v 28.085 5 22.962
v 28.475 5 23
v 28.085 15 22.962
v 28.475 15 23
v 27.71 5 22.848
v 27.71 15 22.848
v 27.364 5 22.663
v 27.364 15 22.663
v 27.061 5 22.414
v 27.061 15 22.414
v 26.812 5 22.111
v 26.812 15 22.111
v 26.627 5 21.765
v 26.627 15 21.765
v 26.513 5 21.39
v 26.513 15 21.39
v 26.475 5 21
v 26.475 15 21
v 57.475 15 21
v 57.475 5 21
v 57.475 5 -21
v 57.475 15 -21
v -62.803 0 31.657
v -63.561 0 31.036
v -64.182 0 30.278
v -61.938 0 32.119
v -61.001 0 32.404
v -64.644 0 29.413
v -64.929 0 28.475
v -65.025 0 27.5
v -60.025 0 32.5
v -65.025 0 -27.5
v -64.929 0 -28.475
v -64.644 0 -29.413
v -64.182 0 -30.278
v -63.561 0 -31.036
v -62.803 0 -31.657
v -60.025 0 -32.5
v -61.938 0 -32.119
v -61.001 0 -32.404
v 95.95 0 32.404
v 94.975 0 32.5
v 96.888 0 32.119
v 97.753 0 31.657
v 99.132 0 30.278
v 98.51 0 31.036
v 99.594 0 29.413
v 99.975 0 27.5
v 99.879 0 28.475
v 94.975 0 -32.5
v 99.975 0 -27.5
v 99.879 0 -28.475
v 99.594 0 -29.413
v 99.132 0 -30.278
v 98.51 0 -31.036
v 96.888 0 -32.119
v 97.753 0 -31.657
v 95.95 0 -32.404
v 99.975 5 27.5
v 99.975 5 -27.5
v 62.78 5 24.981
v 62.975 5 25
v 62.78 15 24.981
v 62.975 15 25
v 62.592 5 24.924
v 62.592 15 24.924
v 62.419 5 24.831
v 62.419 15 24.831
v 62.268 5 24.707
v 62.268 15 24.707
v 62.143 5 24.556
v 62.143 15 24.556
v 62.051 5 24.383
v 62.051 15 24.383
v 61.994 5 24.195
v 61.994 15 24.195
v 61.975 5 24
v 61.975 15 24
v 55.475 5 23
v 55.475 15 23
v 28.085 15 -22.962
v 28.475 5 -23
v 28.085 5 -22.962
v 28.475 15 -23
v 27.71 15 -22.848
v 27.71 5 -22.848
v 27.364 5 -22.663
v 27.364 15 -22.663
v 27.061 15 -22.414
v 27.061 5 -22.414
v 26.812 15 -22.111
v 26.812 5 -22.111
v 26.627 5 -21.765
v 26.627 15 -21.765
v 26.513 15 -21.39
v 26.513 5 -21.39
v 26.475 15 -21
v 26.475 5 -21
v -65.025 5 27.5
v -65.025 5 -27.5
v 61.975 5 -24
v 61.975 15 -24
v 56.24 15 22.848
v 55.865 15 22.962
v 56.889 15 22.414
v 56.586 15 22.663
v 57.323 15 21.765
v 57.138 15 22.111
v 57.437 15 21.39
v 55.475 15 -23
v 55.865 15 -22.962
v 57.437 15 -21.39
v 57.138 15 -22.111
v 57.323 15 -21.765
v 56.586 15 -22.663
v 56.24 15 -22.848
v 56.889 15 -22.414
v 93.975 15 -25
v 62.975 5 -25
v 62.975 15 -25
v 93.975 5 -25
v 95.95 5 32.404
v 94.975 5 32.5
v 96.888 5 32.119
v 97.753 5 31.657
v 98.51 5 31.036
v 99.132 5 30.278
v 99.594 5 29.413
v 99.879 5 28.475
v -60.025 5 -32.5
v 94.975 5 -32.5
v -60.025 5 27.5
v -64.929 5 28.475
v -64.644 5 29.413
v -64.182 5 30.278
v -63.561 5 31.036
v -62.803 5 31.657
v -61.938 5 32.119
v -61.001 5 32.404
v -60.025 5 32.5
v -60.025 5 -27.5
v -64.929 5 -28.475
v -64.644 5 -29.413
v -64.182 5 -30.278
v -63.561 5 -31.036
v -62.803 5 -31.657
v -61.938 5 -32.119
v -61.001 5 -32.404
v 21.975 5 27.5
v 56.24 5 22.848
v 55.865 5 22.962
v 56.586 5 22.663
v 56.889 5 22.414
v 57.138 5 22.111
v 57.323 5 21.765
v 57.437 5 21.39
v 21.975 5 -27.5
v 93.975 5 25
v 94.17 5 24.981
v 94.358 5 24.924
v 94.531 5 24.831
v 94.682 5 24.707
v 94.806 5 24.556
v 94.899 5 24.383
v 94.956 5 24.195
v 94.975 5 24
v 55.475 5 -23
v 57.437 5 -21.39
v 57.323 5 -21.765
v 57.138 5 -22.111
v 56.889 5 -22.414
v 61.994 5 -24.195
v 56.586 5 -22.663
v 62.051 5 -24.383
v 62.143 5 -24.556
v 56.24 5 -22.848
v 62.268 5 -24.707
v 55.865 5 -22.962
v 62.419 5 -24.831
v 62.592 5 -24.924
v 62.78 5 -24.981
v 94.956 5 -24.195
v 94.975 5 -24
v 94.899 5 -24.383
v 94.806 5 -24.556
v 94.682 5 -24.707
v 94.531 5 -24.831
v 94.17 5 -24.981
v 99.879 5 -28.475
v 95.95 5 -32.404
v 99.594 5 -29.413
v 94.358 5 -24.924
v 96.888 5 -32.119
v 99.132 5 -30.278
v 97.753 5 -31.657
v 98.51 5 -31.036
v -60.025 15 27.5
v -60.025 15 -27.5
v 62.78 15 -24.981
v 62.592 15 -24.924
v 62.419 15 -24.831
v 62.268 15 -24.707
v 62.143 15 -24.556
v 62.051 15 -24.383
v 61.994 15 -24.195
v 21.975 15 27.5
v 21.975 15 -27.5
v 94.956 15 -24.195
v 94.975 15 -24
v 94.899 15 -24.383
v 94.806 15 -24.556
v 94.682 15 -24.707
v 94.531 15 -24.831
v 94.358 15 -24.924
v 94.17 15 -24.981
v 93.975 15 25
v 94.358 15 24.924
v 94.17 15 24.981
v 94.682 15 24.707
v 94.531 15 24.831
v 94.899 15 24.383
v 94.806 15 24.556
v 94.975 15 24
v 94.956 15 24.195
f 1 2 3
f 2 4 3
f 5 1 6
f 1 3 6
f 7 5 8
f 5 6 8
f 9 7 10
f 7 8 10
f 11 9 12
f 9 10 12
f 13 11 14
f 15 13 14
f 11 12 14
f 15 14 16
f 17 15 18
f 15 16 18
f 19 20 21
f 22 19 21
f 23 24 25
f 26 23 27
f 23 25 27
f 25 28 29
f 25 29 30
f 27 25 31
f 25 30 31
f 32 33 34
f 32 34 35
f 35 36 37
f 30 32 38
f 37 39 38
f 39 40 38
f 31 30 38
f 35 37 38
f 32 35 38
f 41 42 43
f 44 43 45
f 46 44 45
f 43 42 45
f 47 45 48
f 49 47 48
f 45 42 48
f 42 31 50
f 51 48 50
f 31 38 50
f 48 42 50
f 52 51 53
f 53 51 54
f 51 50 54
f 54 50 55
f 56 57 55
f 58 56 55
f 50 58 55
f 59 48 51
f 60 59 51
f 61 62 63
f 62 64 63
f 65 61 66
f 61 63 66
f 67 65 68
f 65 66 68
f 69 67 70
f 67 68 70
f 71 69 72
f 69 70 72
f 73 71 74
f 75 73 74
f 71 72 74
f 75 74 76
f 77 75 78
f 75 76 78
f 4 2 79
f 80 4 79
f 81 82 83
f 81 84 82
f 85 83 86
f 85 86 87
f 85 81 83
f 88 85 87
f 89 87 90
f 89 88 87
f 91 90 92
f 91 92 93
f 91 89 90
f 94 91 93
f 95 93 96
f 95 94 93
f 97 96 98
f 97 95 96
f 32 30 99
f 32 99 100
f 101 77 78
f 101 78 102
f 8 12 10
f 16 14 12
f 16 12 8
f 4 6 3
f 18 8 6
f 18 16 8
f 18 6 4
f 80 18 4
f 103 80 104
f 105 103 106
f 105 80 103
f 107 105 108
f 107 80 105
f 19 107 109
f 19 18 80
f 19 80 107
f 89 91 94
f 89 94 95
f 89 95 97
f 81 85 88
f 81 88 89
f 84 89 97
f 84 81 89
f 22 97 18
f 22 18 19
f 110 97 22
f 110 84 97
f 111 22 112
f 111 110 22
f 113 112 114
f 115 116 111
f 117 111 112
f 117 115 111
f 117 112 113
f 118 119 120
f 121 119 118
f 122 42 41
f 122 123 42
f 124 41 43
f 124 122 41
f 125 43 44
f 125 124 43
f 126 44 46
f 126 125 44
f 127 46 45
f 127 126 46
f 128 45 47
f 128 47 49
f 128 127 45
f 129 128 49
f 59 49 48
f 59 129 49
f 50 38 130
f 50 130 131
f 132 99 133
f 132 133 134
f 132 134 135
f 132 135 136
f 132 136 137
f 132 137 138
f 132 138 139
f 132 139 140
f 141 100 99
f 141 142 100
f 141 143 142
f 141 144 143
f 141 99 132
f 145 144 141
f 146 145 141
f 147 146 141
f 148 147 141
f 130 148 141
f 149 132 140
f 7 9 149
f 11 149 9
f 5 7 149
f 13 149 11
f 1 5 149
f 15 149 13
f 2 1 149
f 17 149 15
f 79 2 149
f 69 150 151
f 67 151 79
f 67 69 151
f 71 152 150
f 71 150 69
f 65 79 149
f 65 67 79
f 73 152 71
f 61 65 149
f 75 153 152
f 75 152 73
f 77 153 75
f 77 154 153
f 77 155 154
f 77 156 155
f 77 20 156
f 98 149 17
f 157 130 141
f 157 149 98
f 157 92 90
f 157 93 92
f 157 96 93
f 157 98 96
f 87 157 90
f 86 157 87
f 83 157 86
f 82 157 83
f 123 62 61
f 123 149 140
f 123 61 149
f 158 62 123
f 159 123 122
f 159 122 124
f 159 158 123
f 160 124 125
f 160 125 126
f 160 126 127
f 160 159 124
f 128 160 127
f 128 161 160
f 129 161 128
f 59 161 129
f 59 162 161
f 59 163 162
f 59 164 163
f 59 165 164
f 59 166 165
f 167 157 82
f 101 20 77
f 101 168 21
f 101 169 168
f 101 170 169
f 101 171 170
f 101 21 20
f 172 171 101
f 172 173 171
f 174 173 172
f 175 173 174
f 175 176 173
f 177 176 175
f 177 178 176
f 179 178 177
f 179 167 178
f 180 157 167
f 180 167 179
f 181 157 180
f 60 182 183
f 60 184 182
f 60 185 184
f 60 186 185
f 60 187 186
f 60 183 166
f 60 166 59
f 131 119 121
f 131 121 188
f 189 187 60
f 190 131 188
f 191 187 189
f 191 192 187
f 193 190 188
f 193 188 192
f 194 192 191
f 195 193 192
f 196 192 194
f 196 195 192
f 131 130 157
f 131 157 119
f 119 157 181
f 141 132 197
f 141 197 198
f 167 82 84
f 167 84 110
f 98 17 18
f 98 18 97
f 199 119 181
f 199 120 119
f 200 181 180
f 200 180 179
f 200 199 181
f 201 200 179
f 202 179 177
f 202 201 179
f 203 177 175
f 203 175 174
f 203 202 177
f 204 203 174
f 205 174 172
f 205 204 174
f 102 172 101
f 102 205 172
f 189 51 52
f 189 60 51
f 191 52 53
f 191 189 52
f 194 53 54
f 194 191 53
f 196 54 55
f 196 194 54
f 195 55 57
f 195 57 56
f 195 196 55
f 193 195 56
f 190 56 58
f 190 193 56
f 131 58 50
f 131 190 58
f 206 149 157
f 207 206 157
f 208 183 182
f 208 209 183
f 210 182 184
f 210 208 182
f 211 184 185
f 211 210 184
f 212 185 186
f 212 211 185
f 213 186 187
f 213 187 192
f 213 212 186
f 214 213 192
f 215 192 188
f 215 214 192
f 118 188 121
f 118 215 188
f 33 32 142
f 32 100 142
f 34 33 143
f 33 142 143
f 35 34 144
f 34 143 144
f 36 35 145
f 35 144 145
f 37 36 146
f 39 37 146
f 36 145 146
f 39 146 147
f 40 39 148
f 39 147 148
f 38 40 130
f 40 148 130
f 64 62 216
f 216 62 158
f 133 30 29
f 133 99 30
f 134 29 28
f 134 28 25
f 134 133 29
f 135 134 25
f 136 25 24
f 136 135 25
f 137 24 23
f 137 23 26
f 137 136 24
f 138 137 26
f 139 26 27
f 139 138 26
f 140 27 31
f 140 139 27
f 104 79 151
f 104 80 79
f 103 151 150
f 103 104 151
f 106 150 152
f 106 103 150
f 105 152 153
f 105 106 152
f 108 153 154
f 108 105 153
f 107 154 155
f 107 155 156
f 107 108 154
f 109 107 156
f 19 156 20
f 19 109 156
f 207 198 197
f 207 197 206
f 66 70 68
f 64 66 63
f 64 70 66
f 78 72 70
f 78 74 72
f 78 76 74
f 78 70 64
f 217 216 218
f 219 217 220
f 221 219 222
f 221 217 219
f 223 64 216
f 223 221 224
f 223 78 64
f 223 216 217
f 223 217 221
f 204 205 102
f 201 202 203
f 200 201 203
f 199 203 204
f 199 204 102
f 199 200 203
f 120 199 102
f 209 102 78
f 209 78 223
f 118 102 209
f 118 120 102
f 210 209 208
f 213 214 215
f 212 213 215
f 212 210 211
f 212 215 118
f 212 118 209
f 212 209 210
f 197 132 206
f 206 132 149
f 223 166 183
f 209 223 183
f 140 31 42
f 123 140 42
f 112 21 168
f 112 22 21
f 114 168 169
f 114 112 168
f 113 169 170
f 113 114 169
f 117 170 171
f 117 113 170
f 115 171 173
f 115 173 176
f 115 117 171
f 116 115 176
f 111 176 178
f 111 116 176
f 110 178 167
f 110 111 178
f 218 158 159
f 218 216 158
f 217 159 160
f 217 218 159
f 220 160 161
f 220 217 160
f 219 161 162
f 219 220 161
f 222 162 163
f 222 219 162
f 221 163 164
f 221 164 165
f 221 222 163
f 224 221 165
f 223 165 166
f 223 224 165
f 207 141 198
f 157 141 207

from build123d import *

# Parameters (mm, degrees)
SKETCH1_W           = 165
SKETCH1_H           = 65
BOSS_EXTRUDE1_DEPTH = 5
FILLET1_R           = 5
SKETCH2_W           = 82
SKETCH2_H           = 55
SKETCH2_W_2         = 31
SKETCH2_H_2         = 46
SKETCH2_W_3         = 33
SKETCH2_H_3         = 50
BOSS_EXTRUDE2_DEPTH = 10
FILLET2_R           = 2
FILLET3_R           = 1


with BuildPart() as part:
    # Sketch1 → Boss-Extrude1 (new body)
    with BuildSketch(Plane(origin=(0, 0, 0), x_dir=(1, 0, 0), z_dir=(0, 1, 0))):
        with Locations((17.474934091, 0)):
            Rectangle(SKETCH1_W, SKETCH1_H)
    extrude(amount=BOSS_EXTRUDE1_DEPTH)

    # Fillet1
    fillet1_edges = [part.edges().sort_by_distance(p)[0] for p in [
        (-65.025065909, 2.5, -32.5),
        (99.974934091, 2.5, -32.5),
        (99.974934091, 2.5, 32.5),
        (-65.025065909, 2.5, 32.5),
    ]]
    fillet(fillet1_edges, radius=FILLET1_R)

    # Sketch2 → Boss-Extrude2 (add)
    with BuildSketch(Plane(origin=(0, 5, 0), x_dir=(1, 0, 0), z_dir=(0, 1, 0))):
        with Locations((-19.025065909, 0)):
            Rectangle(SKETCH2_W, SKETCH2_H)
        with Locations((41.974934091, 0)):
            Rectangle(SKETCH2_W_2, SKETCH2_H_2)
        with Locations((78.474934091, 0)):
            Rectangle(SKETCH2_W_3, SKETCH2_H_3)
    extrude(amount=BOSS_EXTRUDE2_DEPTH)

    # Fillet2
    fillet2_edges = [part.edges().sort_by_distance(p)[0] for p in [
        (26.474934091, 10, -23),
        (26.474934091, 10, 23),
        (57.474934091, 10, 23),
        (57.474934091, 10, -23),
    ]]
    fillet(fillet2_edges, radius=FILLET2_R)

    # Fillet3
    fillet3_edges = [part.edges().sort_by_distance(p)[0] for p in [
        (61.974934091, 10, -25),
        (61.974934091, 10, 25),
        (94.974934091, 10, 25),
        (94.974934091, 10, -25),
    ]]
    fillet(fillet3_edges, radius=FILLET3_R)


solid = part.part
